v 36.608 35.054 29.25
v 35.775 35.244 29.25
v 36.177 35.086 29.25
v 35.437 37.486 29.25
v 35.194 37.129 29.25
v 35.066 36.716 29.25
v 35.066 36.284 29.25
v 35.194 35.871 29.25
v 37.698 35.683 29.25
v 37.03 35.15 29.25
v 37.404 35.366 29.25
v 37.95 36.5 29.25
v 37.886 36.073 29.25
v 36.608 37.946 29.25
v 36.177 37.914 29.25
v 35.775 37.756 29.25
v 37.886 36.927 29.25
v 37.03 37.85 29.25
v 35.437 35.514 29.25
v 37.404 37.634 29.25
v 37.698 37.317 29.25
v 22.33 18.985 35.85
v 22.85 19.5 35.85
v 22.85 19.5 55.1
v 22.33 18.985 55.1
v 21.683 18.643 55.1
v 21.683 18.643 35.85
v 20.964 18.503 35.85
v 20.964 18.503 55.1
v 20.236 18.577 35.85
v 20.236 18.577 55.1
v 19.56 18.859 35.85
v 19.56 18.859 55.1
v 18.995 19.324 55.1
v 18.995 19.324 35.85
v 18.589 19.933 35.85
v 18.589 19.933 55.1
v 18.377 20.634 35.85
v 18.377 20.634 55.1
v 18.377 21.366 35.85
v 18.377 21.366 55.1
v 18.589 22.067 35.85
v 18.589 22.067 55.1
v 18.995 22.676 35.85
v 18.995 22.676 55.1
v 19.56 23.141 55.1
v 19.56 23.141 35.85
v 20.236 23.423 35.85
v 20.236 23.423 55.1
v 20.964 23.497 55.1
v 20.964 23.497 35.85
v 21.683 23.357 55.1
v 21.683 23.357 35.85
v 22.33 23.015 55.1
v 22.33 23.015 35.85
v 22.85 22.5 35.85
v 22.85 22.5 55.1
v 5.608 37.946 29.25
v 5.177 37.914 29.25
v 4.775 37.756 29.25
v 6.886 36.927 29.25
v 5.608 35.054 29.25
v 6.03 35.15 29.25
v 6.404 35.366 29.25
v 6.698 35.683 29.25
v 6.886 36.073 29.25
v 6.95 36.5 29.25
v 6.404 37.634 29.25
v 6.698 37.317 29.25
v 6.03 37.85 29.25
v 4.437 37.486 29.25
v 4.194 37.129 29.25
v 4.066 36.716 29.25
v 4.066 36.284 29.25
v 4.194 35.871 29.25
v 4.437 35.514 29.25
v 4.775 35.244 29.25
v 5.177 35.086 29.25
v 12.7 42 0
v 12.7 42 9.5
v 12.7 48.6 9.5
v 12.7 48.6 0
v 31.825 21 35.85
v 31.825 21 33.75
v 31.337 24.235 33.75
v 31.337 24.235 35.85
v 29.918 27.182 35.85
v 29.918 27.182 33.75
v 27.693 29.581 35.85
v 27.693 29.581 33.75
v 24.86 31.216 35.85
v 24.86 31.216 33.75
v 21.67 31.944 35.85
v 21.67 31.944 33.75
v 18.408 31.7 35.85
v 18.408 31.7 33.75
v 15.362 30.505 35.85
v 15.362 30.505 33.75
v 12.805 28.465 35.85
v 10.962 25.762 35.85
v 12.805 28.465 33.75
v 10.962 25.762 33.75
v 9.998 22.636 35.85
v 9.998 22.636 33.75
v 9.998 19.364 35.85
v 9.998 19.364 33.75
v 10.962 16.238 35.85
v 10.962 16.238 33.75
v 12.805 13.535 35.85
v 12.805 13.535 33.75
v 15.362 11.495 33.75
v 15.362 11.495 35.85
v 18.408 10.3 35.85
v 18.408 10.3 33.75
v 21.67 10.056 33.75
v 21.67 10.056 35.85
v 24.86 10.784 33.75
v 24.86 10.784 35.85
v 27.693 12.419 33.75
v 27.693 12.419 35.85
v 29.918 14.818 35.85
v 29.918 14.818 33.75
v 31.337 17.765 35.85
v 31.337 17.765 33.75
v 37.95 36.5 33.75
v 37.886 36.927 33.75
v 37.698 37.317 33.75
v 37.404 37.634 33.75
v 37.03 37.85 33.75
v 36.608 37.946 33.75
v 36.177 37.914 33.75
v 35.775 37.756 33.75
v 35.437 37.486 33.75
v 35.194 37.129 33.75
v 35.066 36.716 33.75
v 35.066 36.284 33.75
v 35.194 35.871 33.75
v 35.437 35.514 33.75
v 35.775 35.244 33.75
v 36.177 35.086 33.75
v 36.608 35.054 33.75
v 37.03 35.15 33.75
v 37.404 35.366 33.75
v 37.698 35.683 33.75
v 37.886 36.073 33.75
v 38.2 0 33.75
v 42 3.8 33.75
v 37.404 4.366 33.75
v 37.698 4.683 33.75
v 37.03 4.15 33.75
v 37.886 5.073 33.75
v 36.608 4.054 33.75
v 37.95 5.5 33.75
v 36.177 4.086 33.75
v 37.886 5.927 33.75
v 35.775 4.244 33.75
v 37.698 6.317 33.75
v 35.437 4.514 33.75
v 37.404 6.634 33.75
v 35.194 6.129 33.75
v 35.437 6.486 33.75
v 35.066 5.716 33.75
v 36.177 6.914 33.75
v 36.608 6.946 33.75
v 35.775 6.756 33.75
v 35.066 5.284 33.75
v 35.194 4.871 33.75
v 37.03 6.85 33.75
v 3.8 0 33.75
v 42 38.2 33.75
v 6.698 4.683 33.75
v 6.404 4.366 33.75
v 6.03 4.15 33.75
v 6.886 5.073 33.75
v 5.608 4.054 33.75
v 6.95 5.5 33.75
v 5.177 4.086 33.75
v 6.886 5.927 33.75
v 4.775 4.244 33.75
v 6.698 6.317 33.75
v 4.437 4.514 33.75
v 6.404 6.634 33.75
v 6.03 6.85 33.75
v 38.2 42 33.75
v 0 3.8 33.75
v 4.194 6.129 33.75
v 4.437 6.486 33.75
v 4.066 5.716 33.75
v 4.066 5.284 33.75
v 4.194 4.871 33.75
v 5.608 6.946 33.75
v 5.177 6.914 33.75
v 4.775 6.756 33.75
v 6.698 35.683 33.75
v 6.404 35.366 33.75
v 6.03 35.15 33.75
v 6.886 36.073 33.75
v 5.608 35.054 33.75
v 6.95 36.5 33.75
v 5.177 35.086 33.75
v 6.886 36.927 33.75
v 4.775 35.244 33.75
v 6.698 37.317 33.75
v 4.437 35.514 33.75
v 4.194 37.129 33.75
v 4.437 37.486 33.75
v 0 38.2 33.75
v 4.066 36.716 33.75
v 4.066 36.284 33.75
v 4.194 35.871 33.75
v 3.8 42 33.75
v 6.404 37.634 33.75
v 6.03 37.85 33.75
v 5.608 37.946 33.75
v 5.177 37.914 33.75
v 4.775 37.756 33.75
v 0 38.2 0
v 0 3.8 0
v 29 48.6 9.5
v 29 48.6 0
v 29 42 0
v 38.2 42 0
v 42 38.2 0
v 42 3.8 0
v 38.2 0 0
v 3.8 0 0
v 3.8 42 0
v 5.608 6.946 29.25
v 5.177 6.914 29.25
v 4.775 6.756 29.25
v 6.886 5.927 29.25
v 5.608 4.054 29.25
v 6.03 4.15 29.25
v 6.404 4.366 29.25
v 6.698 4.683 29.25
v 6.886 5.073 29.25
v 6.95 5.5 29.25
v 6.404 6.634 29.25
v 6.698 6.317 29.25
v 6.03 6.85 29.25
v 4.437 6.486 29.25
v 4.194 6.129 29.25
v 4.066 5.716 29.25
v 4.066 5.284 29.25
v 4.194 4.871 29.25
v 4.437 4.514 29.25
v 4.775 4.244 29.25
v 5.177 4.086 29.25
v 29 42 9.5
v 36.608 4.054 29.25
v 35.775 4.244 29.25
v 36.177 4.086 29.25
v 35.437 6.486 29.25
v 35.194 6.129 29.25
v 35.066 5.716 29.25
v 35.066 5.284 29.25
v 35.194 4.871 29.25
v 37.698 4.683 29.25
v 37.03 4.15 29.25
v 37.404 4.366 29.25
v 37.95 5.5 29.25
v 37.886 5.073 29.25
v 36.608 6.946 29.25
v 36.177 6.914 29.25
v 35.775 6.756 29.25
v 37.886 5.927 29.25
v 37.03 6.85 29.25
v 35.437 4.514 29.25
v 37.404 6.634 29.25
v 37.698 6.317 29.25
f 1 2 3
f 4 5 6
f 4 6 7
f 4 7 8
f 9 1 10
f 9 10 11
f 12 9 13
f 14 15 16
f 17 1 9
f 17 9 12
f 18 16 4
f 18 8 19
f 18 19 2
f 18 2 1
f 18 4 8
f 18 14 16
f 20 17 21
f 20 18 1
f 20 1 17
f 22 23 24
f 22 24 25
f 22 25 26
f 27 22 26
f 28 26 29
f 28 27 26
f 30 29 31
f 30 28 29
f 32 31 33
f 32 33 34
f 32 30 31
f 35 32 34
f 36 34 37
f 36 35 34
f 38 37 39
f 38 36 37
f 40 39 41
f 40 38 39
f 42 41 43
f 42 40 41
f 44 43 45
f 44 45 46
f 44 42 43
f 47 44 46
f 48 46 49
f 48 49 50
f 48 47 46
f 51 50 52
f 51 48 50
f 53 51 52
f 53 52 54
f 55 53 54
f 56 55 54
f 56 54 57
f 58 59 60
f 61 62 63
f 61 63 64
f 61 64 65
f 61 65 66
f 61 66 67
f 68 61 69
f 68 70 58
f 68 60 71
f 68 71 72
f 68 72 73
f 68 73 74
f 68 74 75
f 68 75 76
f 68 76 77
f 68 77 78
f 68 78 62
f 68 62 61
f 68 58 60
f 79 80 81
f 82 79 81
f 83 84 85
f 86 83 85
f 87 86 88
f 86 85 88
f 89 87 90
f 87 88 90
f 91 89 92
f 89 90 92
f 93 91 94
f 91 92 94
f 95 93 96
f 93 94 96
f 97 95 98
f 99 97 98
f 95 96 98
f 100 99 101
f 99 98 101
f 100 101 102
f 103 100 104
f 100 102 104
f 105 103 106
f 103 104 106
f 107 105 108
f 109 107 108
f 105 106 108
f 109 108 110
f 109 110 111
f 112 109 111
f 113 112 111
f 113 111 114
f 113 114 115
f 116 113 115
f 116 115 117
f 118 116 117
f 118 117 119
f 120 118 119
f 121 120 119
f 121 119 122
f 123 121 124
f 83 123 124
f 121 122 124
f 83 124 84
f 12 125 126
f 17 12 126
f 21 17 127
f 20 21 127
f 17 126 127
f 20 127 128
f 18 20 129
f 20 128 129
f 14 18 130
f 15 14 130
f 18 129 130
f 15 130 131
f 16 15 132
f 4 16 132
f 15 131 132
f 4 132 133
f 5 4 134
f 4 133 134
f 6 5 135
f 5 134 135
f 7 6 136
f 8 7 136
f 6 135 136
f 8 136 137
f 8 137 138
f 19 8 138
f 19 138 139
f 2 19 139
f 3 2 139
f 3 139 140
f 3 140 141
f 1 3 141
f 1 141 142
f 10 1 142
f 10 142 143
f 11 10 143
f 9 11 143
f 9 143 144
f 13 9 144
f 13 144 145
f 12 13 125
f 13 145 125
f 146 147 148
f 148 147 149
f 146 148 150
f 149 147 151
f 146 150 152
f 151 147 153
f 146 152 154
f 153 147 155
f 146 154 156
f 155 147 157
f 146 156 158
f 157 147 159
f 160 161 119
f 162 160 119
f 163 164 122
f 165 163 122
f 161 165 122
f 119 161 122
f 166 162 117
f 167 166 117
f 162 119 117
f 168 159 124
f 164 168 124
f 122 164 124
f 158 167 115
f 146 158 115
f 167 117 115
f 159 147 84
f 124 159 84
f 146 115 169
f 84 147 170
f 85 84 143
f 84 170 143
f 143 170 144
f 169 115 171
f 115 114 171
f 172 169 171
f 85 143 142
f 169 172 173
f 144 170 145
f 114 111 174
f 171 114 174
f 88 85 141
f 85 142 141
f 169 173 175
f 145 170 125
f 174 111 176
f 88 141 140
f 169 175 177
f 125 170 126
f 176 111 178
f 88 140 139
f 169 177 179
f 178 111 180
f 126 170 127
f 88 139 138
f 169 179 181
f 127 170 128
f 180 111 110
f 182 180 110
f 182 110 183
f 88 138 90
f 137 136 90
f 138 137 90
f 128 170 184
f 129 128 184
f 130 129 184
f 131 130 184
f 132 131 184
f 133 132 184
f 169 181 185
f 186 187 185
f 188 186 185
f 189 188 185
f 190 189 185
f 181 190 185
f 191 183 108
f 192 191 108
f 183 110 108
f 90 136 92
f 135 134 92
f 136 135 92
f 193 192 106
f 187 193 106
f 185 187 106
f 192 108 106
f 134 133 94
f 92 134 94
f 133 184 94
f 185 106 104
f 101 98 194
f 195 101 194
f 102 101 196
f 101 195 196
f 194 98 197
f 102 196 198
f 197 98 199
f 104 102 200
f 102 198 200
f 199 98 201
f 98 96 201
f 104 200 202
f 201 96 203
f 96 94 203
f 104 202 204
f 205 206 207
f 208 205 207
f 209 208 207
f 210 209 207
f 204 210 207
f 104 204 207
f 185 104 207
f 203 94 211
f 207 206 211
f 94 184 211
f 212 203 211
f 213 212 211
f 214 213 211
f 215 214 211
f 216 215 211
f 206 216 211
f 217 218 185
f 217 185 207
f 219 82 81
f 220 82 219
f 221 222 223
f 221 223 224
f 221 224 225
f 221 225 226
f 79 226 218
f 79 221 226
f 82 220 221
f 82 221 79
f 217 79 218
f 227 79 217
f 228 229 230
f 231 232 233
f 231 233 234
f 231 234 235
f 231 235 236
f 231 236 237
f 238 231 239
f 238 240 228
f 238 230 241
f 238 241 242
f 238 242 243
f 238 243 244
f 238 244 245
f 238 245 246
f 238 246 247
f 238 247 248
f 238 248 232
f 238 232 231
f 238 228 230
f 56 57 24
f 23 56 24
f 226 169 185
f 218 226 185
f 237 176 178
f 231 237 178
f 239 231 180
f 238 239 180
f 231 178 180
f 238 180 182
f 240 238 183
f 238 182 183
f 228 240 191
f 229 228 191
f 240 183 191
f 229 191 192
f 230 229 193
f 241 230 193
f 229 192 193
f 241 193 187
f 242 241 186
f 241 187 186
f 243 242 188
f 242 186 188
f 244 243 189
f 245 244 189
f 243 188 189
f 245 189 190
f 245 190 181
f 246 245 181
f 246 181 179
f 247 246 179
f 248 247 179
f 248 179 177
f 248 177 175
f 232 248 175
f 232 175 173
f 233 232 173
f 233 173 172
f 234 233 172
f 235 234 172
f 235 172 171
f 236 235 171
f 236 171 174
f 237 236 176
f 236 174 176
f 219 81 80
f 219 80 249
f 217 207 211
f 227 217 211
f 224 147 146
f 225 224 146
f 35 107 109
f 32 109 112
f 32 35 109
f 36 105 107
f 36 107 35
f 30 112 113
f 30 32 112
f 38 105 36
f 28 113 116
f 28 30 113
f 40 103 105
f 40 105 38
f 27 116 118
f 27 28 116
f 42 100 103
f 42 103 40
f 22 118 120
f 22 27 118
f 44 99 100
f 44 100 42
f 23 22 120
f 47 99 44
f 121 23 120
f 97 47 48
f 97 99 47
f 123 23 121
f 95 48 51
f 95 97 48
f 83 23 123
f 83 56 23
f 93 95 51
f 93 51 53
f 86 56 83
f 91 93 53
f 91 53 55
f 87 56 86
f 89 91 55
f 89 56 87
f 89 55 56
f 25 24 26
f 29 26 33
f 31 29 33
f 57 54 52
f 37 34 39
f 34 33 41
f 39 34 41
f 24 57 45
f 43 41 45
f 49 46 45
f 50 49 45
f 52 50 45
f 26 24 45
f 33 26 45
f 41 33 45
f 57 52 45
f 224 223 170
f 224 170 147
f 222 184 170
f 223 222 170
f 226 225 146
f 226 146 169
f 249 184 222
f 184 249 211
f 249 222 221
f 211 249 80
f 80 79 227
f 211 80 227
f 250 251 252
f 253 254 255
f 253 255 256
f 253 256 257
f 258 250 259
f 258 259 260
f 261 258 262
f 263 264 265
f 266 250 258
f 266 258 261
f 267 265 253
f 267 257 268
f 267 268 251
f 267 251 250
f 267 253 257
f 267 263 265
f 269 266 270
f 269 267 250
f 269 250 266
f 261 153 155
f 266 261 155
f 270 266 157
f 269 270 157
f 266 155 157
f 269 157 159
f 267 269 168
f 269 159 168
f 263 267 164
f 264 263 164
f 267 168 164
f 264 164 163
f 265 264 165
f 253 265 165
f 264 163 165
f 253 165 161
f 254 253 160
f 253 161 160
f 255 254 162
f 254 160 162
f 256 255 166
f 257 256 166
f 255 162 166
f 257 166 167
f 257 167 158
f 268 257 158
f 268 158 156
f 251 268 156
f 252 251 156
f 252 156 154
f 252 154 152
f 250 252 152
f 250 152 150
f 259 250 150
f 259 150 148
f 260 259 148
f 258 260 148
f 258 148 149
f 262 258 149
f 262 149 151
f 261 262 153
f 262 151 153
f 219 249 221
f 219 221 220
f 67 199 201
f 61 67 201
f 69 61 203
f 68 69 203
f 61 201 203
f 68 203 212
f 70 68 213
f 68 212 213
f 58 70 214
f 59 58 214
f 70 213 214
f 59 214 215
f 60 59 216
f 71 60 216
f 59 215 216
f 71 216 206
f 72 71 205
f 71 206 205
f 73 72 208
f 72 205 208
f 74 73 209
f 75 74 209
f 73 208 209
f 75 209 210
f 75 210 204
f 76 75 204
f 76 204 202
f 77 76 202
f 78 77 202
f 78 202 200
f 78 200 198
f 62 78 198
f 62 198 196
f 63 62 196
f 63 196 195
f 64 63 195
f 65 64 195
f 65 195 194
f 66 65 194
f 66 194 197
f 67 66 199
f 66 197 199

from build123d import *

# Parameters (mm, degrees)
BOSS_EXTRUDE1_DEPTH = 33.75
SKETCH1_3_W         = 16.3
SKETCH1_3_H         = 6.6
BOSS_EXTRUDE2_DEPTH = 9.5
SKETCH2_R           = 10.975
BOSS_EXTRUDE3_DEPTH = 2.1
BOSS_EXTRUDE4_DEPTH = 19.25
SKETCH4_R           = 1.45
CUT_EXTRUDE1_DEPTH  = 4.5


with BuildPart() as part:
    # Sketch1 → Boss-Extrude1 (new body)
    with BuildSketch(Plane.XY):
        Polygon((29, 42), (12.7, 42), (3.8, 42), (0, 38.2), (0, 3.8), (3.8, 0), (38.2, 0), (42, 3.8), (42, 38.2), (38.2, 42), align=None)
    extrude(amount=BOSS_EXTRUDE1_DEPTH)

    # Sketch1<3> → Boss-Extrude2 (add)
    with BuildSketch(Plane.XY):
        with Locations((20.85, 45.3)):
            Rectangle(SKETCH1_3_W, SKETCH1_3_H)
    extrude(amount=BOSS_EXTRUDE2_DEPTH)

    # Sketch2 → Boss-Extrude3 (add)
    with BuildSketch(Plane.XY.offset(33.75)):
        with Locations((20.85, 21)):
            Circle(SKETCH2_R)
    extrude(amount=BOSS_EXTRUDE3_DEPTH)

    # Sketch3 → Boss-Extrude4 (add)
    with BuildSketch(Plane.XY.offset(35.85)):
        with BuildLine():
            Line((22.85, 22.5), (22.85, 19.5))
            ThreePointArc((22.85, 19.5), (18.35, 21), (22.85, 22.5))
        make_face()
    extrude(amount=BOSS_EXTRUDE4_DEPTH)

    # Sketch4 → Cut-Extrude1 (cut)
    with BuildSketch(Plane.XY.offset(33.75)):
        with Locations((5.5, 36.5)):
            Circle(SKETCH4_R)
        with Locations((36.5, 36.5)):
            Circle(SKETCH4_R)
        with Locations((5.5, 5.5)):
            Circle(SKETCH4_R)
        with Locations((36.5, 5.5)):
            Circle(SKETCH4_R)
    extrude(amount=-CUT_EXTRUDE1_DEPTH, mode=Mode.SUBTRACT)


solid = part.part
